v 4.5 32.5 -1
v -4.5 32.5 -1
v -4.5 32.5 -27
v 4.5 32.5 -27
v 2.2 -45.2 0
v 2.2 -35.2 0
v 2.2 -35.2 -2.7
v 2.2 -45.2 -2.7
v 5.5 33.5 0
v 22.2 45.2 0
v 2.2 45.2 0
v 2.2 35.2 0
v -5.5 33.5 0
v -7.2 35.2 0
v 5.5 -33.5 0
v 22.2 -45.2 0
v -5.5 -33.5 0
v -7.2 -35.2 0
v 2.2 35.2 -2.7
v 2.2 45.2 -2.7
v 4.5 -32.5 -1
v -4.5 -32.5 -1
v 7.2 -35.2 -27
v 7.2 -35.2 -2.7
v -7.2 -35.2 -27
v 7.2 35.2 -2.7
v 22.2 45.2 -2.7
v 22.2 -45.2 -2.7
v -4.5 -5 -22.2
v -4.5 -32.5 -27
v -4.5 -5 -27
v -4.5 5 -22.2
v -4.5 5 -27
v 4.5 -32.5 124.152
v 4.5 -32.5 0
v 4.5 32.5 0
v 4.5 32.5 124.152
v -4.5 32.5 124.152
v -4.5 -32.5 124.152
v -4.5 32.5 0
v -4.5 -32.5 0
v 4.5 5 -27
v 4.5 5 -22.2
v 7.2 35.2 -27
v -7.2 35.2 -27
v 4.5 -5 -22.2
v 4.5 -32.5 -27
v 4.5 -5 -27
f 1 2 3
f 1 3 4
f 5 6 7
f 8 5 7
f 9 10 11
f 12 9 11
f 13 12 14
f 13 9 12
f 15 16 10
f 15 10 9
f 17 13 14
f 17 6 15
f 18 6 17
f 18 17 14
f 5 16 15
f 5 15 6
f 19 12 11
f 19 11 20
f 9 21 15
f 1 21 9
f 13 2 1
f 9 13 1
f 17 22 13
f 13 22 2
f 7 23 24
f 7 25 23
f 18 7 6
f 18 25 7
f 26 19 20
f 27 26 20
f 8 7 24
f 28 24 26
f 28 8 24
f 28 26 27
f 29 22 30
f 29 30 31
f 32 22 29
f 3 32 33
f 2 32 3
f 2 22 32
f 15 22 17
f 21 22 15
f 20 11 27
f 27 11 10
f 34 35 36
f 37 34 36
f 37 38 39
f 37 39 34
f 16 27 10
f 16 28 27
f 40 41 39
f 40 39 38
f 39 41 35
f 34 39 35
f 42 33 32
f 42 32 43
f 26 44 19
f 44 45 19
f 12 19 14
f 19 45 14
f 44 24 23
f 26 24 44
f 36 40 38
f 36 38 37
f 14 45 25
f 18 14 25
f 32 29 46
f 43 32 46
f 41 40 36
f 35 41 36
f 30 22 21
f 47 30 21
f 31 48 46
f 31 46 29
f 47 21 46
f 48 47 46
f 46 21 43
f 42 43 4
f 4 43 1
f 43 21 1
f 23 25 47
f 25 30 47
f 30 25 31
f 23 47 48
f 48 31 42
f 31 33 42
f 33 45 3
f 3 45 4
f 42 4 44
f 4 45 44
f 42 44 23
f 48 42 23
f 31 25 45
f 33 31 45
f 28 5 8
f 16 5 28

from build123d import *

# Parameters (mm, degrees)
F0_W      = 9
F0_H      = 65
F1_DEPTH  = 124.1524014622
F3_W      = 14.4
F3_H      = 70.4
F3_W_2    = 9
F3_H_2    = 65
F4_DEPTH  = 27
F5_W      = 70.4
F5_H      = 2.7
F6_DEPTH  = 15
F8_DEPTH  = 10
F10_W     = 9
F10_H     = 10
F10_W_2   = 2.7
F11_DEPTH = 4.8
F12_SIZE  = 1


with BuildPart() as f1:
    # F0 (on Top) → F1 (new body)
    with BuildSketch(Plane.XY):
        Rectangle(F0_W, F0_H)
    extrude(amount=F1_DEPTH)


with BuildPart() as f4:
    # F3 (on face) → F4 (new body)
    with BuildSketch(Plane.XY):
        Rectangle(F3_W, F3_H)
        Rectangle(F3_W_2, F3_H_2, mode=Mode.SUBTRACT)
    extrude(amount=-F4_DEPTH)

    # F5 (on face) → F6 (join)
    with BuildSketch(Plane.YZ.offset(7.2)):
        with Locations((0, -1.35)):
            Rectangle(F5_W, F5_H)
    extrude(amount=F6_DEPTH)

    # F7 (on face) → F8 (join)
    with BuildSketch(Plane.XZ.offset(35.2)):
        Polygon((22.2, -2.7), (22.2, 0), (2.2, 0), (2.2, -2.7), (7.2, -2.7), align=None)
    extrude(amount=F8_DEPTH)

    # F9: F4 across plane


with BuildPart() as f4_1:
    add(f4.part)
    add(f4.part.mirror(Plane.XZ))

    # F10 (on face) → F11 (join)
    with BuildSketch(Plane(origin=(0, 0, -27), x_dir=(1, 0, 0), z_dir=(0, 0, -1))):
        Rectangle(F10_W, F10_H)
        with Locations((-5.85, 0)):
            Rectangle(F10_W_2, F10_H)
        with Locations((5.85, 0)):
            Rectangle(F10_W_2, F10_H)
    extrude(amount=-F11_DEPTH)

    # F12
    f12_edges = [f4_1.edges().sort_by_distance(p)[0] for p in [
        (4.5, 0, 0),
        (0, -32.5, 0),
        (-4.5, 0, 0),
        (0, 32.5, 0),
    ]]
    chamfer(f12_edges, length=F12_SIZE)


solid = Compound([f1.part, f4_1.part])
